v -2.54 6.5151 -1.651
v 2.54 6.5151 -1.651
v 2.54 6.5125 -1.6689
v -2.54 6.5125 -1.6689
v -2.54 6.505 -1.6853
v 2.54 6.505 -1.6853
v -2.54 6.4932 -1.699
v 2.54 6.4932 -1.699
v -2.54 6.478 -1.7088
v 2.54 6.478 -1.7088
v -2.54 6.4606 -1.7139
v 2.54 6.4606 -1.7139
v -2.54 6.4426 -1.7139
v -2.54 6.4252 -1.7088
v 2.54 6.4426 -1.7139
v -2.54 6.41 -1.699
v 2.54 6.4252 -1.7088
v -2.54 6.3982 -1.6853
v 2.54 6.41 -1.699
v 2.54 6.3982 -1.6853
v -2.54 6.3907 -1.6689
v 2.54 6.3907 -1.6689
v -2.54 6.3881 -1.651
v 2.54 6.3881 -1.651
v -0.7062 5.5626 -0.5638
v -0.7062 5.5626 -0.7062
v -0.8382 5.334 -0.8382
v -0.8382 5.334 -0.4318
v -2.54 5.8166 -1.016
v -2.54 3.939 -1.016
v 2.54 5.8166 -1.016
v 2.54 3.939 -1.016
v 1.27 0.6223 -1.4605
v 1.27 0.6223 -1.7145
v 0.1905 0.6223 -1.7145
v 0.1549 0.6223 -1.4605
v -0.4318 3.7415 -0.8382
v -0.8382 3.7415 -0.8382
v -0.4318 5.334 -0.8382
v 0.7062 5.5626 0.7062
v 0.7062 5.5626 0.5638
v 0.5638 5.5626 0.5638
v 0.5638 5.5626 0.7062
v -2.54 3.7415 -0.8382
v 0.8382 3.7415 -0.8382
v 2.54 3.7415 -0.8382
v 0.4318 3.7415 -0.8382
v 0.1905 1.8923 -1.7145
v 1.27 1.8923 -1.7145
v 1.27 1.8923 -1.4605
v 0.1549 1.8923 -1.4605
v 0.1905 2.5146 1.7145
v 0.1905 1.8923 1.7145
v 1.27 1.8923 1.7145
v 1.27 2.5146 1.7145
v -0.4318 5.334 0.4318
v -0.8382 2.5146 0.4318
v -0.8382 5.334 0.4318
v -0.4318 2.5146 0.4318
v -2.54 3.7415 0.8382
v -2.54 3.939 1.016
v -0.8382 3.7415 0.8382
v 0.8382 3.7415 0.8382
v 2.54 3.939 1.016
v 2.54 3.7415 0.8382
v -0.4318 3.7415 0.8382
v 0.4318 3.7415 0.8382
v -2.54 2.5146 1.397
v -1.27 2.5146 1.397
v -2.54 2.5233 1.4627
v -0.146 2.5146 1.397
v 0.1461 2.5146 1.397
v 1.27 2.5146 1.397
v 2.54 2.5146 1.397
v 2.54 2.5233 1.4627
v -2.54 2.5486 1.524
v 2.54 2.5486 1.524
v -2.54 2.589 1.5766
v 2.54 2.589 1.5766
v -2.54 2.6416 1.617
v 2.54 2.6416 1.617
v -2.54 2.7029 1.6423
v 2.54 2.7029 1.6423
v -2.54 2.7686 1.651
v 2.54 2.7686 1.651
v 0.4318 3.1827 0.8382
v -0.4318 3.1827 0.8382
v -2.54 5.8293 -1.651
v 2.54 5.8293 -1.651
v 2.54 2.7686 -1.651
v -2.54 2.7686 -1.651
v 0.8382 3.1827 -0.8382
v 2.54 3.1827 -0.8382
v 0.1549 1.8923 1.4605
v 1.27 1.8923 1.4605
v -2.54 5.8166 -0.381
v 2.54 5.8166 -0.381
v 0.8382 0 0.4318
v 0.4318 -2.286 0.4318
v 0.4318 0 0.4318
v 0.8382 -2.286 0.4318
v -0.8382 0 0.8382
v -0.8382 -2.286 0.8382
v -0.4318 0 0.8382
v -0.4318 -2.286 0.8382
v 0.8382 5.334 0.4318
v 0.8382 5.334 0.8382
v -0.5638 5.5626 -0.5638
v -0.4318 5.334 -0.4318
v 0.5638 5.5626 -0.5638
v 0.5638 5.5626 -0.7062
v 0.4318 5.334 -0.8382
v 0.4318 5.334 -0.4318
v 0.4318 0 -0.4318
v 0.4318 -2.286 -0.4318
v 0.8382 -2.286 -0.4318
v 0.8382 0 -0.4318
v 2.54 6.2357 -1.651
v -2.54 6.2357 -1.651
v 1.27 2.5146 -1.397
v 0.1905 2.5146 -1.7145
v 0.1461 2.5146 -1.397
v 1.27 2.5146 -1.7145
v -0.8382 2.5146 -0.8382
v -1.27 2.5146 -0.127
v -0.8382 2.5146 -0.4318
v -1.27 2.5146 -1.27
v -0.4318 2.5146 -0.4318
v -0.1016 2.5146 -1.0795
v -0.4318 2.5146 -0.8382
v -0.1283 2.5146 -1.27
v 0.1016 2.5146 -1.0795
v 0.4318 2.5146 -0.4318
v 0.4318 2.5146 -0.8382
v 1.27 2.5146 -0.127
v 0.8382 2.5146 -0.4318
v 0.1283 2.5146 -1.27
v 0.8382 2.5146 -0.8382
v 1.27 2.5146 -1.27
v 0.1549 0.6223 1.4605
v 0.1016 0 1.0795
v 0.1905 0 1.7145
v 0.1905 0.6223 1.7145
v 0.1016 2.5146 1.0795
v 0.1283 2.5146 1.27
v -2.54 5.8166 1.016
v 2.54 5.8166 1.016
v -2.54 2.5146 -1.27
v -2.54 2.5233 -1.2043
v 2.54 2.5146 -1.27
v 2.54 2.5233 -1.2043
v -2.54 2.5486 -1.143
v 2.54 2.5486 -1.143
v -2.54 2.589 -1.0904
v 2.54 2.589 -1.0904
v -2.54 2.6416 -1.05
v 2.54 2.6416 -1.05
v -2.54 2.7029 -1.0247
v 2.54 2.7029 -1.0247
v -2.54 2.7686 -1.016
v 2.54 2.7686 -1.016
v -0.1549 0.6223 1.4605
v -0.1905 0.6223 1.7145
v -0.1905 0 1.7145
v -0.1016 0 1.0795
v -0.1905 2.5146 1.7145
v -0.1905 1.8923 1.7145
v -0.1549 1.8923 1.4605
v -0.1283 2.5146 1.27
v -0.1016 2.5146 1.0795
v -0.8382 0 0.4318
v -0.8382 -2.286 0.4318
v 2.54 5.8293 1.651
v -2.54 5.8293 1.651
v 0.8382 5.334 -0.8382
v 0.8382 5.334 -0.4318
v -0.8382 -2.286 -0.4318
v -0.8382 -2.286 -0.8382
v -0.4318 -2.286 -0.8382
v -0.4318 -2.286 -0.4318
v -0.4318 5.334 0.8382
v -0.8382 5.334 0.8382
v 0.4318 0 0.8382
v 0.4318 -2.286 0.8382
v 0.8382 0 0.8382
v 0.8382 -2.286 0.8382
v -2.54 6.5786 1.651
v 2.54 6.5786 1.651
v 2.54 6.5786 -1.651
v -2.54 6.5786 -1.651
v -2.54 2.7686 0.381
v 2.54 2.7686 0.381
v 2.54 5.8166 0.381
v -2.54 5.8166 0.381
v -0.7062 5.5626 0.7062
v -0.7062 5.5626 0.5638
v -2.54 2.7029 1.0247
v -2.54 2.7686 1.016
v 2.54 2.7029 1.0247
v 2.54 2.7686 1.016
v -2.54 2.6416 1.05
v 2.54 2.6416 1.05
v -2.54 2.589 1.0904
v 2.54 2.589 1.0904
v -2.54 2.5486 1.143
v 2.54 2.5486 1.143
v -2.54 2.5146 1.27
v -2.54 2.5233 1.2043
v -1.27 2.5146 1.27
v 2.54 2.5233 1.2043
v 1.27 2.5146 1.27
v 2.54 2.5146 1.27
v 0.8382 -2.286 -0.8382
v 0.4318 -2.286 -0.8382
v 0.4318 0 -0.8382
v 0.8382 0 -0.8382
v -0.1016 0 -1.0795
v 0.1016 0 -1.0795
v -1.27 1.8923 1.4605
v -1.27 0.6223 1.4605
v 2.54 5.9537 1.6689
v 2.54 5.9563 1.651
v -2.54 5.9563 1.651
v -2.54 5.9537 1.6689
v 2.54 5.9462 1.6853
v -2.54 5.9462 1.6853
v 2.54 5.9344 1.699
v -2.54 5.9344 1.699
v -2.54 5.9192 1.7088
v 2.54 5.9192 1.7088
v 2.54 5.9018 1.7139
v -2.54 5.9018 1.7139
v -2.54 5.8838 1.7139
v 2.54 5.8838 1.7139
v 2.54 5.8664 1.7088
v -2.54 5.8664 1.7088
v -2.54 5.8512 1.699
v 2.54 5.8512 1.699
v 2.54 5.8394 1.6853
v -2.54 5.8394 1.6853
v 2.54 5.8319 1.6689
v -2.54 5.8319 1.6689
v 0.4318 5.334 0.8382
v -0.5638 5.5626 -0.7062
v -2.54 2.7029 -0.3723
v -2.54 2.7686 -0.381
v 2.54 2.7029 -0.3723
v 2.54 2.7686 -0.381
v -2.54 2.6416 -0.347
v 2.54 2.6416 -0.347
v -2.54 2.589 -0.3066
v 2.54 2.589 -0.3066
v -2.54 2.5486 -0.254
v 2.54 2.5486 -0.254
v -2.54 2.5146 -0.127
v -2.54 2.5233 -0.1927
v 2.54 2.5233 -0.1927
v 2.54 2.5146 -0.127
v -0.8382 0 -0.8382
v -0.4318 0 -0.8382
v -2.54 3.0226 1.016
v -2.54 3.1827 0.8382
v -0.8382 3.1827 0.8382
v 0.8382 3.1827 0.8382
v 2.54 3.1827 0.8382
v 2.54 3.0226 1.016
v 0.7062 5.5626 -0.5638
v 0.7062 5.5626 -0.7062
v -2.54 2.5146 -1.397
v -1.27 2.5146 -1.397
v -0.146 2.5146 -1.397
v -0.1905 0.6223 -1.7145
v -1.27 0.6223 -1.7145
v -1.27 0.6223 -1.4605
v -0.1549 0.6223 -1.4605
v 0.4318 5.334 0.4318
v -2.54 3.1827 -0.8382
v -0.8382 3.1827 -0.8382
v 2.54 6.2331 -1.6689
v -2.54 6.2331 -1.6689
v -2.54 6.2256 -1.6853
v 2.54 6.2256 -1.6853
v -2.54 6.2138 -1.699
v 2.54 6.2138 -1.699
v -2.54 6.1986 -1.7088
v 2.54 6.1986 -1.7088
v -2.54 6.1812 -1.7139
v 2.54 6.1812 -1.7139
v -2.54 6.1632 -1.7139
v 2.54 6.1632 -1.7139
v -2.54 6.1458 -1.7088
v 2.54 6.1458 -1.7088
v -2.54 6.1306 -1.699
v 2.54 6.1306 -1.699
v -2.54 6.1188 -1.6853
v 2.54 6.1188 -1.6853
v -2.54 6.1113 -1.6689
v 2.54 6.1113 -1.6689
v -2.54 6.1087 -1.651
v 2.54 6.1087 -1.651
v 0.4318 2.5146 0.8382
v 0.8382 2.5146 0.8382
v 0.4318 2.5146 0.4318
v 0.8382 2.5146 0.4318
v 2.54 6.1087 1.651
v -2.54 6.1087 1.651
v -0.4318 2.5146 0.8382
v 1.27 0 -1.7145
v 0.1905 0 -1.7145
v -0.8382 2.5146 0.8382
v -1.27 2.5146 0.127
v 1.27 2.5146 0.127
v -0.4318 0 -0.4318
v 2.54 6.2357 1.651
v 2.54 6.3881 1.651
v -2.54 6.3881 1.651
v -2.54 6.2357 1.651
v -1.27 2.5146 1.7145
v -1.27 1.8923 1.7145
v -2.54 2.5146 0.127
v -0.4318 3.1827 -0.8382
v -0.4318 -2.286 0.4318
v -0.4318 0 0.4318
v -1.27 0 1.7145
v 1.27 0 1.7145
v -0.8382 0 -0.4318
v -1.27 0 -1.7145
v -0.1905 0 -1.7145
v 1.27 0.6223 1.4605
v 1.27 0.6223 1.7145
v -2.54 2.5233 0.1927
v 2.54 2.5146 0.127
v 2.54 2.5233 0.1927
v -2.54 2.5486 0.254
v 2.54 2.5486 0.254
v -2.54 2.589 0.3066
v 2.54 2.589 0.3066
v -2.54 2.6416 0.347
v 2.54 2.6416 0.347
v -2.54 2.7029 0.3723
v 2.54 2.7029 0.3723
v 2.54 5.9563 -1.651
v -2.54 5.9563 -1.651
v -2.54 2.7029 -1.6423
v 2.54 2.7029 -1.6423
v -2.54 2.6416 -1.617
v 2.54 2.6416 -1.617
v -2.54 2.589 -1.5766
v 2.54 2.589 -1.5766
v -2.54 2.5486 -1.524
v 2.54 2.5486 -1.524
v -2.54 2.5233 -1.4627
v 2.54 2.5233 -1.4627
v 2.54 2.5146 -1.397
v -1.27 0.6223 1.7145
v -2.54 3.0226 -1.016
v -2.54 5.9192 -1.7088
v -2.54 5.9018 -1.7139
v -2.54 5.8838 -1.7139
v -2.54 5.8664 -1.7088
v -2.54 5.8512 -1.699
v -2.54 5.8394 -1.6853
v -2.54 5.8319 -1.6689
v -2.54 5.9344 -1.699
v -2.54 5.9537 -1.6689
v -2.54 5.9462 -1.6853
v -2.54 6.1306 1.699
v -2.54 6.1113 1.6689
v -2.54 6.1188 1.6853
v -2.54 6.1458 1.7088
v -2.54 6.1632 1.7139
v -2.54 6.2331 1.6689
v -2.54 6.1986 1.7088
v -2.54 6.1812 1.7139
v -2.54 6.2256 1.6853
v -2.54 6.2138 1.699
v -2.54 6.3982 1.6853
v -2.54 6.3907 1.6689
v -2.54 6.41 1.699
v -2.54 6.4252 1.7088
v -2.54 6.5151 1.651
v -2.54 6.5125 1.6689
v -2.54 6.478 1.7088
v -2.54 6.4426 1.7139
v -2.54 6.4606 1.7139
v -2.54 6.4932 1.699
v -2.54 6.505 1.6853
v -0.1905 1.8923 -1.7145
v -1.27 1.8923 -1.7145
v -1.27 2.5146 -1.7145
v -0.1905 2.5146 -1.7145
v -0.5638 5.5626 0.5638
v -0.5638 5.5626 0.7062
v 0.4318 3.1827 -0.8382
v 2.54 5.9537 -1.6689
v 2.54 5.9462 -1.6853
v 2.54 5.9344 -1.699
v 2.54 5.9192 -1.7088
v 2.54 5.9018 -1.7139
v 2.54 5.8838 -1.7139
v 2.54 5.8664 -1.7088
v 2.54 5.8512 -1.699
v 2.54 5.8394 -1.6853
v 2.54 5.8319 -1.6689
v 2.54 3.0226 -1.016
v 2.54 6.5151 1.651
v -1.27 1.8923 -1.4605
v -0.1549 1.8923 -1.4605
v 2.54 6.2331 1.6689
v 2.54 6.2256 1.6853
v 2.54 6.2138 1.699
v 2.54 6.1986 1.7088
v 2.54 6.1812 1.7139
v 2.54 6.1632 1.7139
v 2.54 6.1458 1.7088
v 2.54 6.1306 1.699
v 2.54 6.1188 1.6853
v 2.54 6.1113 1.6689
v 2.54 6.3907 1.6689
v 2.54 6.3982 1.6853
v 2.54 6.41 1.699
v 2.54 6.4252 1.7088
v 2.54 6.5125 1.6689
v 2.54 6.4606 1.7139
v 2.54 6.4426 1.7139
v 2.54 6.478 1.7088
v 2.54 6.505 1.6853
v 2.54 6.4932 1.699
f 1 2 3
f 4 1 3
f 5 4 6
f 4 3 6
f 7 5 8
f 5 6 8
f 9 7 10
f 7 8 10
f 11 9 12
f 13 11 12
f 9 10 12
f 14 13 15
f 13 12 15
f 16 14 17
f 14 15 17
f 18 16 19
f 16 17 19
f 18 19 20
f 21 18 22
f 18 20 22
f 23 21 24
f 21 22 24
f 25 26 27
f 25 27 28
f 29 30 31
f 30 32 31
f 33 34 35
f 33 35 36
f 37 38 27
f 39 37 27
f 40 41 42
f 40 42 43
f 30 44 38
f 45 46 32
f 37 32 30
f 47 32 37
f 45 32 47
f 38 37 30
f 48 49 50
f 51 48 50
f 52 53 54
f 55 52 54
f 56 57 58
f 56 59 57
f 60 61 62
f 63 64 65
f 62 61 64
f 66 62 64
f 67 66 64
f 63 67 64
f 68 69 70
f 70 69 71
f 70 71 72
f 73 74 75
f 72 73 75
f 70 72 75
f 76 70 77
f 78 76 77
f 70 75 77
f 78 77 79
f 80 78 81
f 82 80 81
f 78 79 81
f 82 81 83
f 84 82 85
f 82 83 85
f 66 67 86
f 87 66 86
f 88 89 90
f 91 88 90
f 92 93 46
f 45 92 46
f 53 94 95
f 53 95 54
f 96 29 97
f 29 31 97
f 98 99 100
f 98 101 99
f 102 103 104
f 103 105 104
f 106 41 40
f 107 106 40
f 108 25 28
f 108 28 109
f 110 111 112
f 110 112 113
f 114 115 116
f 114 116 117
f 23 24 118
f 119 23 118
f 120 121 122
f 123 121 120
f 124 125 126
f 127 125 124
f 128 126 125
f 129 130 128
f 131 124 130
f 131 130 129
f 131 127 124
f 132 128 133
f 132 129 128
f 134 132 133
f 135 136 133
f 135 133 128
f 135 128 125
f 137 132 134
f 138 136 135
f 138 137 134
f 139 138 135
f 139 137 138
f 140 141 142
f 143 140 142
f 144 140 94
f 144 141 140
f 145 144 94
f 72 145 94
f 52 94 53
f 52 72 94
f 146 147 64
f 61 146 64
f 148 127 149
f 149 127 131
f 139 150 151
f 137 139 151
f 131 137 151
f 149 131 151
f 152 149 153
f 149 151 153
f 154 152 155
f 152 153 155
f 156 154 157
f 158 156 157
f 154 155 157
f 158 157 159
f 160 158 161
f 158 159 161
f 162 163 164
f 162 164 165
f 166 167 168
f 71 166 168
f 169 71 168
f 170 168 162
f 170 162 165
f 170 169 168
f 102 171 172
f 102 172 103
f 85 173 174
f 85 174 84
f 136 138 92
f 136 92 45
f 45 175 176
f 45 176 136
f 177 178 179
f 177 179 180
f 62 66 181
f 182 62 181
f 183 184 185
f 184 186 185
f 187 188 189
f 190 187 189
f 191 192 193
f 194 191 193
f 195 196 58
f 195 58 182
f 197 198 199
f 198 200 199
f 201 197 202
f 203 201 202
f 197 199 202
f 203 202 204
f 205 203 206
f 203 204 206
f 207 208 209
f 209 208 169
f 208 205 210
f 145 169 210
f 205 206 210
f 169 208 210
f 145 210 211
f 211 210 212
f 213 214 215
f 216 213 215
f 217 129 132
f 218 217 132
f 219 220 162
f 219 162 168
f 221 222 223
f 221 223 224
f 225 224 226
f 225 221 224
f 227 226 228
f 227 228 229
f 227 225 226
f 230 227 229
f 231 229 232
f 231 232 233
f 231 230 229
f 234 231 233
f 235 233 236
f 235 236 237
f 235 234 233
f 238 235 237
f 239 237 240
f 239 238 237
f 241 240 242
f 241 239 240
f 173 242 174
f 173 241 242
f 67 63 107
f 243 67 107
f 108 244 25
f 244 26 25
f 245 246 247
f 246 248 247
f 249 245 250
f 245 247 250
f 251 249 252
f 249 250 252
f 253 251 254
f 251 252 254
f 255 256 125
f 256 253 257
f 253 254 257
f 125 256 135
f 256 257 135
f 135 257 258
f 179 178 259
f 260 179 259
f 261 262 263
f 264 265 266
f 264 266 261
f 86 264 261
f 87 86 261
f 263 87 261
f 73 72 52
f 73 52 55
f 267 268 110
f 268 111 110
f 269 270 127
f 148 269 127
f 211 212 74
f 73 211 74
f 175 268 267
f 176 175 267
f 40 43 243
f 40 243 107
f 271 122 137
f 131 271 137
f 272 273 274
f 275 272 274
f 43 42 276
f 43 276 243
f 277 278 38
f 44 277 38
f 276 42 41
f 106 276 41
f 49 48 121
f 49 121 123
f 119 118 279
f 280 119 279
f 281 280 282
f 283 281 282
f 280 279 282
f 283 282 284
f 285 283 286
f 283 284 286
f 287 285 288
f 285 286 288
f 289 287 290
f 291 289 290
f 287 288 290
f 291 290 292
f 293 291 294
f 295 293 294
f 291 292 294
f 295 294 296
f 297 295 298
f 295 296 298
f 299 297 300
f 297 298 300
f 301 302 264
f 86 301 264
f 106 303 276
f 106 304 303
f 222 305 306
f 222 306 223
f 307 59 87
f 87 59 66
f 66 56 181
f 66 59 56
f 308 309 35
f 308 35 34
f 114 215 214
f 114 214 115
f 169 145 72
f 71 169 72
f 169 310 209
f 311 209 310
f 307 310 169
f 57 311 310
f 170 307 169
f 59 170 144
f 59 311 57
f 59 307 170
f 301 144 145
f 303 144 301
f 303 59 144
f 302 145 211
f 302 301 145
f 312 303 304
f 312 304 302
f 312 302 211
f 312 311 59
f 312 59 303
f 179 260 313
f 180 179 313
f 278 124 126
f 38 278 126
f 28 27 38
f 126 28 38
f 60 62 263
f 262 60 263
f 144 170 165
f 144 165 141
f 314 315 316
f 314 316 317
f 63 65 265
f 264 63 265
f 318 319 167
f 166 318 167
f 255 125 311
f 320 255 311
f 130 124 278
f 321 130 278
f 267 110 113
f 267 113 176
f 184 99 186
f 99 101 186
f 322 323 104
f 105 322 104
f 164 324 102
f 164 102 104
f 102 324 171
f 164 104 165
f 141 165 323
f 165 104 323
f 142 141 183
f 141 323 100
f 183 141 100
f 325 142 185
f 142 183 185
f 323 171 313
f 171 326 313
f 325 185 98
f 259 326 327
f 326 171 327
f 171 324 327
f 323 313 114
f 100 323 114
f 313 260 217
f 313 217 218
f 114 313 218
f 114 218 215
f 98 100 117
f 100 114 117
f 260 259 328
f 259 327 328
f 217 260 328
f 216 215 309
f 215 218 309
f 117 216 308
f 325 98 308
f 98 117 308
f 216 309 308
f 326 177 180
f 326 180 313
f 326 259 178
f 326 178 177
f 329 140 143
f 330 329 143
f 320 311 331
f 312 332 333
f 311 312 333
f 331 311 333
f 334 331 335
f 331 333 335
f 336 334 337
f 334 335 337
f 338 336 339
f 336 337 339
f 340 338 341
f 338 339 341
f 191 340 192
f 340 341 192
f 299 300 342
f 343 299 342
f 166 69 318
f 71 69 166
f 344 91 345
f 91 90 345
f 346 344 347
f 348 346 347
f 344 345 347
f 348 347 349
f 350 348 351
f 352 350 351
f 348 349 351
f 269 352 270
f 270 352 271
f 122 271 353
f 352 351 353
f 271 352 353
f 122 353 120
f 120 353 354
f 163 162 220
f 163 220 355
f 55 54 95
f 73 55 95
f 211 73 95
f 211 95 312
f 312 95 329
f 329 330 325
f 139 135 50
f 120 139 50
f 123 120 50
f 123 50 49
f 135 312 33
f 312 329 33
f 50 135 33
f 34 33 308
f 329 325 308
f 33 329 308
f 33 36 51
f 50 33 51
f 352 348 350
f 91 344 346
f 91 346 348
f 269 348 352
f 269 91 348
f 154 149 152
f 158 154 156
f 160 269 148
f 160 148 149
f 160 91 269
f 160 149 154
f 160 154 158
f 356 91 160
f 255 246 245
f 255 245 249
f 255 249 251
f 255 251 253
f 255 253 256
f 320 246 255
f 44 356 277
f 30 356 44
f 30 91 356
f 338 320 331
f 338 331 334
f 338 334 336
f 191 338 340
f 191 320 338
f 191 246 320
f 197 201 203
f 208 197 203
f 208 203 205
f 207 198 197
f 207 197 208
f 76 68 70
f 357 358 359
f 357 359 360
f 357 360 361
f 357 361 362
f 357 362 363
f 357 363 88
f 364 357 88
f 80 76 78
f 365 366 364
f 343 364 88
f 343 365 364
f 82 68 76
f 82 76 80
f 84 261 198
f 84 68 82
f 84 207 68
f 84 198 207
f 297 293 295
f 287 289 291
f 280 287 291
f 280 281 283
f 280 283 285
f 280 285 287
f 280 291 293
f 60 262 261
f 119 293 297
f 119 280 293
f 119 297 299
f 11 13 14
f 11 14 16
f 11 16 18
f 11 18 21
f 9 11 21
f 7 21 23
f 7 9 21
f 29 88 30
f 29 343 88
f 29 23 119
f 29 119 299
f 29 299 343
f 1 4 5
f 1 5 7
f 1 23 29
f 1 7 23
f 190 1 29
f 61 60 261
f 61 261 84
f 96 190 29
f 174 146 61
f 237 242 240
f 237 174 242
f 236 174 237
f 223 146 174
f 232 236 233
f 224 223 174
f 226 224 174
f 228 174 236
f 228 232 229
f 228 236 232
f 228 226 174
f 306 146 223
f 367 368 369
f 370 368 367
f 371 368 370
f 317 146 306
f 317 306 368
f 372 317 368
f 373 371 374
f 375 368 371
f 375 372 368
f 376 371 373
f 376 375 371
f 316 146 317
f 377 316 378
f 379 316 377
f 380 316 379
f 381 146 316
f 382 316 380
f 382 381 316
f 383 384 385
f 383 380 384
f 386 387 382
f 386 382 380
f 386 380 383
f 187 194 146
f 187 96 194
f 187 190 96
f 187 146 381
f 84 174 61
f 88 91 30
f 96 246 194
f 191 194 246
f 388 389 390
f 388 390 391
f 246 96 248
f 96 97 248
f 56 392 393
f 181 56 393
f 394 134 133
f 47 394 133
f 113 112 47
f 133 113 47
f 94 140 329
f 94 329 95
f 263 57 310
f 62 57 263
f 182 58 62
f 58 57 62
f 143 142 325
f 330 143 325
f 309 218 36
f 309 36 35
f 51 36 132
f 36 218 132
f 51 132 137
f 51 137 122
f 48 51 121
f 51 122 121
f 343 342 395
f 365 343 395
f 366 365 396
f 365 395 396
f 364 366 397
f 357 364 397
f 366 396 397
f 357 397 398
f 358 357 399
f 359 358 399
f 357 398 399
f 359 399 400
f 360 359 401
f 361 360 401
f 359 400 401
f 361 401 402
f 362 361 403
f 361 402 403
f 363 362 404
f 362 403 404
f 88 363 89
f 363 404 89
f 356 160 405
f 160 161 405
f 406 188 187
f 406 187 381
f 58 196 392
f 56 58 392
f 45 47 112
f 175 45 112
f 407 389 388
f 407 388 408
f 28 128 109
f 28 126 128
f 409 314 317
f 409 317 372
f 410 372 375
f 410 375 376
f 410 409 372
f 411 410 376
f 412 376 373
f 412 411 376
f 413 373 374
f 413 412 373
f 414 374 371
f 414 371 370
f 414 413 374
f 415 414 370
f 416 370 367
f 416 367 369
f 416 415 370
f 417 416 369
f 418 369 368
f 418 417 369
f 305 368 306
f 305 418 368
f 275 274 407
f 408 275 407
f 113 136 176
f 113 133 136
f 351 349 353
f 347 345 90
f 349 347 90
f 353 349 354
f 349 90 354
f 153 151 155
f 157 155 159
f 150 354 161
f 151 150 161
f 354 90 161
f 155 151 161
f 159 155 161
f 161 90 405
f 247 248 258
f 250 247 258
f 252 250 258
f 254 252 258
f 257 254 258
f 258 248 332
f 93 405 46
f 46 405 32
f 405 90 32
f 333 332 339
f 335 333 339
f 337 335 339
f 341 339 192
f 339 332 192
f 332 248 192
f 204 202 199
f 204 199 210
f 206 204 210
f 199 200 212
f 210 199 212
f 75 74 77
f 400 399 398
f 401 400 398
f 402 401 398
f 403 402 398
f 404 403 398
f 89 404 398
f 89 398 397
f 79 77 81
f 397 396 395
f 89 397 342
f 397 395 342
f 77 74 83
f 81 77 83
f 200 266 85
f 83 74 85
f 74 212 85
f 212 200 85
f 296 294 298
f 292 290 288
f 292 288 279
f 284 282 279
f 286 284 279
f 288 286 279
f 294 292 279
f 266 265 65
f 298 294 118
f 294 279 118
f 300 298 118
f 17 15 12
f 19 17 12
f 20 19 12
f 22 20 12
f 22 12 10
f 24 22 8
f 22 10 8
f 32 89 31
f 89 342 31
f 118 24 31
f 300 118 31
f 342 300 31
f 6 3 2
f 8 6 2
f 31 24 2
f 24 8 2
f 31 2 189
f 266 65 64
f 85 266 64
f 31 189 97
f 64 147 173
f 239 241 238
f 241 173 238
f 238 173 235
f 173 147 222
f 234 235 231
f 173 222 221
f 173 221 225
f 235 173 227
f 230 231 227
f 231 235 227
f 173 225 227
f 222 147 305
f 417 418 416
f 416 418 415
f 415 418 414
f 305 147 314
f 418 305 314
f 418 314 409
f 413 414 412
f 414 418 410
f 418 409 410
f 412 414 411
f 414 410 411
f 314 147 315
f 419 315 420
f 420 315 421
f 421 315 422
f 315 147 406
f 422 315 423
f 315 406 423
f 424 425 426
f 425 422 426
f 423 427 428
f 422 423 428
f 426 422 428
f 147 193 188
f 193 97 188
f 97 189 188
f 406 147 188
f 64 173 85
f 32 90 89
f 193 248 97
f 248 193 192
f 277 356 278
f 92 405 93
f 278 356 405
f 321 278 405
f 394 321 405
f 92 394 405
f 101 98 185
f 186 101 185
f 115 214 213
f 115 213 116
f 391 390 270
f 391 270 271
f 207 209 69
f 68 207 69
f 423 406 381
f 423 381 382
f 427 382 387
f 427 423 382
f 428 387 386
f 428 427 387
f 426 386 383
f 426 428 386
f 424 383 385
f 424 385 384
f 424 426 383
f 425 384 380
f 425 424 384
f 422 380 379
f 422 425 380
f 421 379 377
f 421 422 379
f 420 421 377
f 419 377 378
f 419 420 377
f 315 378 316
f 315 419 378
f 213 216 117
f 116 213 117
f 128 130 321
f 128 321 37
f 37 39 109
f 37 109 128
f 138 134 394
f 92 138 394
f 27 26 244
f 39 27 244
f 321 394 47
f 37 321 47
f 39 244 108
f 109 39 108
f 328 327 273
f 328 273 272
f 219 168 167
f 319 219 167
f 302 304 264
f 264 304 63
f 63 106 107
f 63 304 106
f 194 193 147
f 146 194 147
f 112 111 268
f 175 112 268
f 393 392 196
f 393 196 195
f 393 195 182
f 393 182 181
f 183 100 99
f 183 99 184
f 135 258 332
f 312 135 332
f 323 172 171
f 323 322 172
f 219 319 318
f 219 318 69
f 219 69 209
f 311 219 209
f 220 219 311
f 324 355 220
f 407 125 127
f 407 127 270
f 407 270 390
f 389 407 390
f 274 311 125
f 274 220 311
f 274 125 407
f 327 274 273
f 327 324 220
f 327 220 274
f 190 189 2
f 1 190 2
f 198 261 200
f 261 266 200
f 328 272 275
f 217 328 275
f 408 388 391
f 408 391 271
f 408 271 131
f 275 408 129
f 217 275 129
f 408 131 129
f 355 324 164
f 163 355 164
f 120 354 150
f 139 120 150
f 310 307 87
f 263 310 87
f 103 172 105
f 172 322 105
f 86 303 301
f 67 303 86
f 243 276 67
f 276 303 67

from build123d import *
from OCP.BRepFilletAPI import BRepFilletAPI_MakeChamfer

# Parameters (mm, degrees)
SKETCH1_W                      = 2.54
SKETCH1_H                      = 3.429
BASE_DEPTH                     = 2.5146
SNAP_GROOVE_DEPTH              = 4.297821009
SKETCH3_W                      = 0.254
SKETCH3_H                      = 1.27
SIDE_GROOVE_DEPTH              = 4.96412959
SKETCH4_W                      = 0.4064
SKETCH4_H                      = 3.048
PIN_POST_DEPTH                 = 0.2032
POST_TIP_SIZE                  = 0.2286
POST_TIP_SIZE2                 = 0.131982272
POST_PATTERN_COUNT             = 2
POST_PATTERN_PITCH             = 1.27
POST_TIP_OF_POST_PATTERN_SIZE  = 0.2286
POST_TIP_OF_POST_PATTERN_SIZE2 = 0.131982272
SKETCH5_W                      = 0.4064
SKETCH5_H                      = 2.286
TH_TAIL_DEPTH                  = 0.2032
TH_TAIL_PATTERN_COUNT          = 2
TH_TAIL_PATTERN_PITCH          = 1.27
EXTRUDE_P_DEPTH                = 2.54
PPP_25_CUT_DEPTH               = 5.08


with BuildPart() as part:
    # Sketch1 → Base (new body)
    with BuildSketch(Plane(origin=(0, 0, 0), x_dir=(1, 0, 0), z_dir=(0, 1, 0))):
        Rectangle(SKETCH1_W, SKETCH1_H)
    extrude(amount=BASE_DEPTH)

    # Sketch2 → Snap Groove (cut, through all)
    with BuildSketch(Plane(origin=(0, 2.5146, 0), x_dir=(-1, 0, 0), z_dir=(0, 1, 0))):
        Polygon((0.1905, 1.7145), (0.1016, 1.0795), (-0.1016, 1.0795), (-0.1905, 1.7145), align=None)
        Polygon((-0.1905, -1.7145), (0.1905, -1.7145), (0.1016, -1.0795), (-0.1016, -1.0795), align=None)
    extrude(amount=-SNAP_GROOVE_DEPTH, mode=Mode.SUBTRACT)

    # Sketch3 → Side Groove (cut, through all)
    with BuildSketch(Plane.ZY.offset(1.27)):
        with Locations((-1.5875, 1.2573)):
            Rectangle(SKETCH3_W, SKETCH3_H)
        with Locations((1.5875, 1.2573)):
            Rectangle(SKETCH3_W, SKETCH3_H)
    extrude(amount=-SIDE_GROOVE_DEPTH, mode=Mode.SUBTRACT)

    # Sketch4 → Pin Post (add, symmetric)
    with BuildSketch(Plane.ZY.offset(0.635)):
        with Locations((0.635, 4.0386)):
            Rectangle(SKETCH4_W, SKETCH4_H)
        with Locations((-0.635, 4.0386)):
            Rectangle(SKETCH4_W, SKETCH4_H)
    pin_post = extrude(amount=PIN_POST_DEPTH, both=True)

    # Post Tip: one chamfer whose edges measure the first distance from different faces: ONE call of the kernel's chamfer builder (chamfer() names one face for all edges)
    post_tip_edges_1 = [part.edges().sort_by_distance(p)[0] for p in [
        (-0.4318, 5.5626, 0.635),
    ]]
    post_tip_side_1 = [part.faces().sort_by_distance(p)[0] for p in [
        (-0.4318, 4.0386, 0.635),
    ]]
    post_tip_edges_2 = [part.edges().sort_by_distance(p)[0] for p in [
        (-0.635, 5.5626, 0.8382),
    ]]
    post_tip_side_2 = [part.faces().sort_by_distance(p)[0] for p in [
        (-0.635, 4.0386, 0.8382),
    ]]
    post_tip_edges_3 = [part.edges().sort_by_distance(p)[0] for p in [
        (-0.635, 5.5626, 0.4318),
    ]]
    post_tip_side_3 = [part.faces().sort_by_distance(p)[0] for p in [
        (-0.635, 4.0386, 0.4318),
    ]]
    post_tip_edges_4 = [part.edges().sort_by_distance(p)[0] for p in [
        (-0.8382, 5.5626, 0.635),
    ]]
    post_tip_side_4 = [part.faces().sort_by_distance(p)[0] for p in [
        (-0.8382, 4.0386, 0.635),
    ]]
    post_tip_edges_5 = [part.edges().sort_by_distance(p)[0] for p in [
        (-0.4318, 5.5626, -0.635),
    ]]
    post_tip_side_5 = [part.faces().sort_by_distance(p)[0] for p in [
        (-0.4318, 4.0386, -0.635),
    ]]
    post_tip_edges_6 = [part.edges().sort_by_distance(p)[0] for p in [
        (-0.635, 5.5626, -0.4318),
    ]]
    post_tip_side_6 = [part.faces().sort_by_distance(p)[0] for p in [
        (-0.635, 4.0386, -0.4318),
    ]]
    post_tip_edges_7 = [part.edges().sort_by_distance(p)[0] for p in [
        (-0.635, 5.5626, -0.8382),
    ]]
    post_tip_side_7 = [part.faces().sort_by_distance(p)[0] for p in [
        (-0.635, 4.0386, -0.8382),
    ]]
    post_tip_edges_8 = [part.edges().sort_by_distance(p)[0] for p in [
        (-0.8382, 5.5626, -0.635),
    ]]
    post_tip_side_8 = [part.faces().sort_by_distance(p)[0] for p in [
        (-0.8382, 4.0386, -0.635),
    ]]
    post_tip = BRepFilletAPI_MakeChamfer(part.part.solid().wrapped)
    for e in post_tip_edges_1:
        post_tip.Add(POST_TIP_SIZE, POST_TIP_SIZE2, e.wrapped, post_tip_side_1[0].wrapped)  # the first distance lies on this face
    for e in post_tip_edges_2:
        post_tip.Add(POST_TIP_SIZE, POST_TIP_SIZE2, e.wrapped, post_tip_side_2[0].wrapped)  # the first distance lies on this face
    for e in post_tip_edges_3:
        post_tip.Add(POST_TIP_SIZE, POST_TIP_SIZE2, e.wrapped, post_tip_side_3[0].wrapped)  # the first distance lies on this face
    for e in post_tip_edges_4:
        post_tip.Add(POST_TIP_SIZE, POST_TIP_SIZE2, e.wrapped, post_tip_side_4[0].wrapped)  # the first distance lies on this face
    for e in post_tip_edges_5:
        post_tip.Add(POST_TIP_SIZE, POST_TIP_SIZE2, e.wrapped, post_tip_side_5[0].wrapped)  # the first distance lies on this face
    for e in post_tip_edges_6:
        post_tip.Add(POST_TIP_SIZE, POST_TIP_SIZE2, e.wrapped, post_tip_side_6[0].wrapped)  # the first distance lies on this face
    for e in post_tip_edges_7:
        post_tip.Add(POST_TIP_SIZE, POST_TIP_SIZE2, e.wrapped, post_tip_side_7[0].wrapped)  # the first distance lies on this face
    for e in post_tip_edges_8:
        post_tip.Add(POST_TIP_SIZE, POST_TIP_SIZE2, e.wrapped, post_tip_side_8[0].wrapped)  # the first distance lies on this face
    add(Compound.cast(post_tip.Shape()), mode=Mode.REPLACE)

    # Post Pattern: Pin Post ×2
    with Locations(*[(i * POST_PATTERN_PITCH, 0, 0) for i in range(1, POST_PATTERN_COUNT)]):
        add(pin_post)

    # Post Tip of Post Pattern: one chamfer whose edges measure the first distance from different faces: ONE call of the kernel's chamfer builder (chamfer() names one face for all edges)
    post_tip_of_post_pattern_edges_1 = [part.edges().sort_by_distance(p)[0] for p in [
        (0.8382, 5.5626, 0.635),
    ]]
    post_tip_of_post_pattern_side_1 = [part.faces().sort_by_distance(p)[0] for p in [
        (0.8382, 4.0386, 0.635),
    ]]
    post_tip_of_post_pattern_edges_2 = [part.edges().sort_by_distance(p)[0] for p in [
        (0.635, 5.5626, 0.8382),
    ]]
    post_tip_of_post_pattern_side_2 = [part.faces().sort_by_distance(p)[0] for p in [
        (0.635, 4.0386, 0.8382),
    ]]
    post_tip_of_post_pattern_edges_3 = [part.edges().sort_by_distance(p)[0] for p in [
        (0.635, 5.5626, 0.4318),
    ]]
    post_tip_of_post_pattern_side_3 = [part.faces().sort_by_distance(p)[0] for p in [
        (0.635, 4.0386, 0.4318),
    ]]
    post_tip_of_post_pattern_edges_4 = [part.edges().sort_by_distance(p)[0] for p in [
        (0.4318, 5.5626, 0.635),
    ]]
    post_tip_of_post_pattern_side_4 = [part.faces().sort_by_distance(p)[0] for p in [
        (0.4318, 4.0386, 0.635),
    ]]
    post_tip_of_post_pattern_edges_5 = [part.edges().sort_by_distance(p)[0] for p in [
        (0.8382, 5.5626, -0.635),
    ]]
    post_tip_of_post_pattern_side_5 = [part.faces().sort_by_distance(p)[0] for p in [
        (0.8382, 4.0386, -0.635),
    ]]
    post_tip_of_post_pattern_edges_6 = [part.edges().sort_by_distance(p)[0] for p in [
        (0.635, 5.5626, -0.4318),
    ]]
    post_tip_of_post_pattern_side_6 = [part.faces().sort_by_distance(p)[0] for p in [
        (0.635, 4.0386, -0.4318),
    ]]
    post_tip_of_post_pattern_edges_7 = [part.edges().sort_by_distance(p)[0] for p in [
        (0.635, 5.5626, -0.8382),
    ]]
    post_tip_of_post_pattern_side_7 = [part.faces().sort_by_distance(p)[0] for p in [
        (0.635, 4.0386, -0.8382),
    ]]
    post_tip_of_post_pattern_edges_8 = [part.edges().sort_by_distance(p)[0] for p in [
        (0.4318, 5.5626, -0.635),
    ]]
    post_tip_of_post_pattern_side_8 = [part.faces().sort_by_distance(p)[0] for p in [
        (0.4318, 4.0386, -0.635),
    ]]
    post_tip_of_post_pattern = BRepFilletAPI_MakeChamfer(part.part.solid().wrapped)
    for e in post_tip_of_post_pattern_edges_1:
        post_tip_of_post_pattern.Add(POST_TIP_OF_POST_PATTERN_SIZE, POST_TIP_OF_POST_PATTERN_SIZE2, e.wrapped, post_tip_of_post_pattern_side_1[0].wrapped)  # the first distance lies on this face
    for e in post_tip_of_post_pattern_edges_2:
        post_tip_of_post_pattern.Add(POST_TIP_OF_POST_PATTERN_SIZE, POST_TIP_OF_POST_PATTERN_SIZE2, e.wrapped, post_tip_of_post_pattern_side_2[0].wrapped)  # the first distance lies on this face
    for e in post_tip_of_post_pattern_edges_3:
        post_tip_of_post_pattern.Add(POST_TIP_OF_POST_PATTERN_SIZE, POST_TIP_OF_POST_PATTERN_SIZE2, e.wrapped, post_tip_of_post_pattern_side_3[0].wrapped)  # the first distance lies on this face
    for e in post_tip_of_post_pattern_edges_4:
        post_tip_of_post_pattern.Add(POST_TIP_OF_POST_PATTERN_SIZE, POST_TIP_OF_POST_PATTERN_SIZE2, e.wrapped, post_tip_of_post_pattern_side_4[0].wrapped)  # the first distance lies on this face
    for e in post_tip_of_post_pattern_edges_5:
        post_tip_of_post_pattern.Add(POST_TIP_OF_POST_PATTERN_SIZE, POST_TIP_OF_POST_PATTERN_SIZE2, e.wrapped, post_tip_of_post_pattern_side_5[0].wrapped)  # the first distance lies on this face
    for e in post_tip_of_post_pattern_edges_6:
        post_tip_of_post_pattern.Add(POST_TIP_OF_POST_PATTERN_SIZE, POST_TIP_OF_POST_PATTERN_SIZE2, e.wrapped, post_tip_of_post_pattern_side_6[0].wrapped)  # the first distance lies on this face
    for e in post_tip_of_post_pattern_edges_7:
        post_tip_of_post_pattern.Add(POST_TIP_OF_POST_PATTERN_SIZE, POST_TIP_OF_POST_PATTERN_SIZE2, e.wrapped, post_tip_of_post_pattern_side_7[0].wrapped)  # the first distance lies on this face
    for e in post_tip_of_post_pattern_edges_8:
        post_tip_of_post_pattern.Add(POST_TIP_OF_POST_PATTERN_SIZE, POST_TIP_OF_POST_PATTERN_SIZE2, e.wrapped, post_tip_of_post_pattern_side_8[0].wrapped)  # the first distance lies on this face
    add(Compound.cast(post_tip_of_post_pattern.Shape()), mode=Mode.REPLACE)

    # Sketch5 → TH Tail (add, symmetric)
    with BuildSketch(Plane.ZY.offset(0.635)):
        with Locations((0.635, -1.143)):
            Rectangle(SKETCH5_W, SKETCH5_H)
        with Locations((-0.635, -1.143)):
            Rectangle(SKETCH5_W, SKETCH5_H)
    th_tail = extrude(amount=TH_TAIL_DEPTH, both=True)

    # TH Tail Pattern: TH Tail ×2
    with Locations(*[(i * TH_TAIL_PATTERN_PITCH, 0, 0) for i in range(1, TH_TAIL_PATTERN_COUNT)]):
        add(th_tail)

    # Sketch24 → Extrude P (add, symmetric)
    with BuildSketch(Plane(origin=(0, 0, 0), x_dir=(0, 0, -1), z_dir=(1, 0, 0))):
        with BuildLine():
            Line((-1.016, 5.8166), (-1.016, 3.938958744))
            Line((-1.016, 3.938958744), (-0.8382, 3.741491839))
            Line((-0.8382, 3.741491839), (-0.8382, 3.182691839))
            Line((-0.8382, 3.182691839), (-1.016, 3.0226))
            Line((-1.016, 3.0226), (-1.016, 2.7686))
            ThreePointArc((-1.016, 2.7686), (-1.090394878, 2.588994878), (-1.27, 2.5146))
            Line((-1.27, 2.5146), (-1.397, 2.5146))
            ThreePointArc((-1.397, 2.5146), (-1.576605122, 2.588994878), (-1.651, 2.7686))
            Line((-1.651, 2.7686), (-1.651, 5.8166))
            Line((-1.651, 5.8166), (-2.921, 5.8166))
            Line((-2.921, 5.8166), (-2.921, 6.5786))
            Line((-2.921, 6.5786), (2.921, 6.5786))
            Line((2.921, 6.5786), (2.921, 5.8166))
            Line((2.921, 5.8166), (1.651, 5.8166))
            Line((1.651, 5.8166), (1.651, 2.7686))
            ThreePointArc((1.651, 2.7686), (1.576605122, 2.588994878), (1.397, 2.5146))
            Line((1.397, 2.5146), (1.27, 2.5146))
            ThreePointArc((1.27, 2.5146), (1.090394878, 2.588994878), (1.016, 2.7686))
            Line((1.016, 2.7686), (1.016, 3.0226))
            Line((1.016, 3.0226), (0.8382, 3.182691839))
            Line((0.8382, 3.182691839), (0.8382, 3.741491839))
            Line((0.8382, 3.741491839), (1.016, 3.938958744))
            Line((1.016, 3.938958744), (1.016, 5.8166))
            Line((1.016, 5.8166), (0.381, 5.8166))
            Line((0.381, 5.8166), (0.381, 2.7686))
            ThreePointArc((0.381, 2.7686), (0.306605122, 2.588994878), (0.127, 2.5146))
            Line((0.127, 2.5146), (-0.127, 2.5146))
            ThreePointArc((-0.127, 2.5146), (-0.306605122, 2.588994878), (-0.381, 2.7686))
            Line((-0.381, 2.7686), (-0.381, 5.8166))
            Line((-0.381, 5.8166), (-1.016, 5.8166))
        make_face()
    extrude(amount=EXTRUDE_P_DEPTH, both=True)

    # Sketch43 → PPP-25 cut (cut)
    with BuildSketch(Plane(origin=(2.54, 0, 0), x_dir=(0, 0, -1), z_dir=(1, 0, 0))):
        with BuildLine():
            Line((-1.651, 5.8293), (-1.651, 5.8166))
            Line((-1.651, 5.8166), (-2.921, 5.8166))
            Line((-2.921, 5.8166), (-2.921, 6.5786))
            Line((-2.921, 6.5786), (-1.651, 6.5786))
            Line((-1.651, 6.5786), (-1.651, 6.5151))
            ThreePointArc((-1.651, 6.5151), (-1.7145, 6.4516), (-1.651, 6.3881))
            Line((-1.651, 6.3881), (-1.651, 6.2357))
            ThreePointArc((-1.651, 6.2357), (-1.7145, 6.1722), (-1.651, 6.1087))
            Line((-1.651, 6.1087), (-1.651, 5.9563))
            ThreePointArc((-1.651, 5.9563), (-1.7145, 5.8928), (-1.651, 5.8293))
        make_face()
        with BuildLine():
            Line((1.651, 6.3881), (1.651, 6.2357))
            ThreePointArc((1.651, 6.2357), (1.7145, 6.1722), (1.651, 6.1087))
            Line((1.651, 6.1087), (1.651, 5.9563))
            ThreePointArc((1.651, 5.9563), (1.7145, 5.8928), (1.651, 5.8293))
            Line((1.651, 5.8293), (1.651, 5.8166))
            Line((1.651, 5.8166), (2.921, 5.8166))
            Line((2.921, 5.8166), (2.921, 6.5786))
            Line((2.921, 6.5786), (1.651, 6.5786))
            Line((1.651, 6.5786), (1.651, 6.5151))
            ThreePointArc((1.651, 6.5151), (1.7145, 6.4516), (1.651, 6.3881))
        make_face()
    extrude(amount=-PPP_25_CUT_DEPTH, mode=Mode.SUBTRACT)


solid = part.part
